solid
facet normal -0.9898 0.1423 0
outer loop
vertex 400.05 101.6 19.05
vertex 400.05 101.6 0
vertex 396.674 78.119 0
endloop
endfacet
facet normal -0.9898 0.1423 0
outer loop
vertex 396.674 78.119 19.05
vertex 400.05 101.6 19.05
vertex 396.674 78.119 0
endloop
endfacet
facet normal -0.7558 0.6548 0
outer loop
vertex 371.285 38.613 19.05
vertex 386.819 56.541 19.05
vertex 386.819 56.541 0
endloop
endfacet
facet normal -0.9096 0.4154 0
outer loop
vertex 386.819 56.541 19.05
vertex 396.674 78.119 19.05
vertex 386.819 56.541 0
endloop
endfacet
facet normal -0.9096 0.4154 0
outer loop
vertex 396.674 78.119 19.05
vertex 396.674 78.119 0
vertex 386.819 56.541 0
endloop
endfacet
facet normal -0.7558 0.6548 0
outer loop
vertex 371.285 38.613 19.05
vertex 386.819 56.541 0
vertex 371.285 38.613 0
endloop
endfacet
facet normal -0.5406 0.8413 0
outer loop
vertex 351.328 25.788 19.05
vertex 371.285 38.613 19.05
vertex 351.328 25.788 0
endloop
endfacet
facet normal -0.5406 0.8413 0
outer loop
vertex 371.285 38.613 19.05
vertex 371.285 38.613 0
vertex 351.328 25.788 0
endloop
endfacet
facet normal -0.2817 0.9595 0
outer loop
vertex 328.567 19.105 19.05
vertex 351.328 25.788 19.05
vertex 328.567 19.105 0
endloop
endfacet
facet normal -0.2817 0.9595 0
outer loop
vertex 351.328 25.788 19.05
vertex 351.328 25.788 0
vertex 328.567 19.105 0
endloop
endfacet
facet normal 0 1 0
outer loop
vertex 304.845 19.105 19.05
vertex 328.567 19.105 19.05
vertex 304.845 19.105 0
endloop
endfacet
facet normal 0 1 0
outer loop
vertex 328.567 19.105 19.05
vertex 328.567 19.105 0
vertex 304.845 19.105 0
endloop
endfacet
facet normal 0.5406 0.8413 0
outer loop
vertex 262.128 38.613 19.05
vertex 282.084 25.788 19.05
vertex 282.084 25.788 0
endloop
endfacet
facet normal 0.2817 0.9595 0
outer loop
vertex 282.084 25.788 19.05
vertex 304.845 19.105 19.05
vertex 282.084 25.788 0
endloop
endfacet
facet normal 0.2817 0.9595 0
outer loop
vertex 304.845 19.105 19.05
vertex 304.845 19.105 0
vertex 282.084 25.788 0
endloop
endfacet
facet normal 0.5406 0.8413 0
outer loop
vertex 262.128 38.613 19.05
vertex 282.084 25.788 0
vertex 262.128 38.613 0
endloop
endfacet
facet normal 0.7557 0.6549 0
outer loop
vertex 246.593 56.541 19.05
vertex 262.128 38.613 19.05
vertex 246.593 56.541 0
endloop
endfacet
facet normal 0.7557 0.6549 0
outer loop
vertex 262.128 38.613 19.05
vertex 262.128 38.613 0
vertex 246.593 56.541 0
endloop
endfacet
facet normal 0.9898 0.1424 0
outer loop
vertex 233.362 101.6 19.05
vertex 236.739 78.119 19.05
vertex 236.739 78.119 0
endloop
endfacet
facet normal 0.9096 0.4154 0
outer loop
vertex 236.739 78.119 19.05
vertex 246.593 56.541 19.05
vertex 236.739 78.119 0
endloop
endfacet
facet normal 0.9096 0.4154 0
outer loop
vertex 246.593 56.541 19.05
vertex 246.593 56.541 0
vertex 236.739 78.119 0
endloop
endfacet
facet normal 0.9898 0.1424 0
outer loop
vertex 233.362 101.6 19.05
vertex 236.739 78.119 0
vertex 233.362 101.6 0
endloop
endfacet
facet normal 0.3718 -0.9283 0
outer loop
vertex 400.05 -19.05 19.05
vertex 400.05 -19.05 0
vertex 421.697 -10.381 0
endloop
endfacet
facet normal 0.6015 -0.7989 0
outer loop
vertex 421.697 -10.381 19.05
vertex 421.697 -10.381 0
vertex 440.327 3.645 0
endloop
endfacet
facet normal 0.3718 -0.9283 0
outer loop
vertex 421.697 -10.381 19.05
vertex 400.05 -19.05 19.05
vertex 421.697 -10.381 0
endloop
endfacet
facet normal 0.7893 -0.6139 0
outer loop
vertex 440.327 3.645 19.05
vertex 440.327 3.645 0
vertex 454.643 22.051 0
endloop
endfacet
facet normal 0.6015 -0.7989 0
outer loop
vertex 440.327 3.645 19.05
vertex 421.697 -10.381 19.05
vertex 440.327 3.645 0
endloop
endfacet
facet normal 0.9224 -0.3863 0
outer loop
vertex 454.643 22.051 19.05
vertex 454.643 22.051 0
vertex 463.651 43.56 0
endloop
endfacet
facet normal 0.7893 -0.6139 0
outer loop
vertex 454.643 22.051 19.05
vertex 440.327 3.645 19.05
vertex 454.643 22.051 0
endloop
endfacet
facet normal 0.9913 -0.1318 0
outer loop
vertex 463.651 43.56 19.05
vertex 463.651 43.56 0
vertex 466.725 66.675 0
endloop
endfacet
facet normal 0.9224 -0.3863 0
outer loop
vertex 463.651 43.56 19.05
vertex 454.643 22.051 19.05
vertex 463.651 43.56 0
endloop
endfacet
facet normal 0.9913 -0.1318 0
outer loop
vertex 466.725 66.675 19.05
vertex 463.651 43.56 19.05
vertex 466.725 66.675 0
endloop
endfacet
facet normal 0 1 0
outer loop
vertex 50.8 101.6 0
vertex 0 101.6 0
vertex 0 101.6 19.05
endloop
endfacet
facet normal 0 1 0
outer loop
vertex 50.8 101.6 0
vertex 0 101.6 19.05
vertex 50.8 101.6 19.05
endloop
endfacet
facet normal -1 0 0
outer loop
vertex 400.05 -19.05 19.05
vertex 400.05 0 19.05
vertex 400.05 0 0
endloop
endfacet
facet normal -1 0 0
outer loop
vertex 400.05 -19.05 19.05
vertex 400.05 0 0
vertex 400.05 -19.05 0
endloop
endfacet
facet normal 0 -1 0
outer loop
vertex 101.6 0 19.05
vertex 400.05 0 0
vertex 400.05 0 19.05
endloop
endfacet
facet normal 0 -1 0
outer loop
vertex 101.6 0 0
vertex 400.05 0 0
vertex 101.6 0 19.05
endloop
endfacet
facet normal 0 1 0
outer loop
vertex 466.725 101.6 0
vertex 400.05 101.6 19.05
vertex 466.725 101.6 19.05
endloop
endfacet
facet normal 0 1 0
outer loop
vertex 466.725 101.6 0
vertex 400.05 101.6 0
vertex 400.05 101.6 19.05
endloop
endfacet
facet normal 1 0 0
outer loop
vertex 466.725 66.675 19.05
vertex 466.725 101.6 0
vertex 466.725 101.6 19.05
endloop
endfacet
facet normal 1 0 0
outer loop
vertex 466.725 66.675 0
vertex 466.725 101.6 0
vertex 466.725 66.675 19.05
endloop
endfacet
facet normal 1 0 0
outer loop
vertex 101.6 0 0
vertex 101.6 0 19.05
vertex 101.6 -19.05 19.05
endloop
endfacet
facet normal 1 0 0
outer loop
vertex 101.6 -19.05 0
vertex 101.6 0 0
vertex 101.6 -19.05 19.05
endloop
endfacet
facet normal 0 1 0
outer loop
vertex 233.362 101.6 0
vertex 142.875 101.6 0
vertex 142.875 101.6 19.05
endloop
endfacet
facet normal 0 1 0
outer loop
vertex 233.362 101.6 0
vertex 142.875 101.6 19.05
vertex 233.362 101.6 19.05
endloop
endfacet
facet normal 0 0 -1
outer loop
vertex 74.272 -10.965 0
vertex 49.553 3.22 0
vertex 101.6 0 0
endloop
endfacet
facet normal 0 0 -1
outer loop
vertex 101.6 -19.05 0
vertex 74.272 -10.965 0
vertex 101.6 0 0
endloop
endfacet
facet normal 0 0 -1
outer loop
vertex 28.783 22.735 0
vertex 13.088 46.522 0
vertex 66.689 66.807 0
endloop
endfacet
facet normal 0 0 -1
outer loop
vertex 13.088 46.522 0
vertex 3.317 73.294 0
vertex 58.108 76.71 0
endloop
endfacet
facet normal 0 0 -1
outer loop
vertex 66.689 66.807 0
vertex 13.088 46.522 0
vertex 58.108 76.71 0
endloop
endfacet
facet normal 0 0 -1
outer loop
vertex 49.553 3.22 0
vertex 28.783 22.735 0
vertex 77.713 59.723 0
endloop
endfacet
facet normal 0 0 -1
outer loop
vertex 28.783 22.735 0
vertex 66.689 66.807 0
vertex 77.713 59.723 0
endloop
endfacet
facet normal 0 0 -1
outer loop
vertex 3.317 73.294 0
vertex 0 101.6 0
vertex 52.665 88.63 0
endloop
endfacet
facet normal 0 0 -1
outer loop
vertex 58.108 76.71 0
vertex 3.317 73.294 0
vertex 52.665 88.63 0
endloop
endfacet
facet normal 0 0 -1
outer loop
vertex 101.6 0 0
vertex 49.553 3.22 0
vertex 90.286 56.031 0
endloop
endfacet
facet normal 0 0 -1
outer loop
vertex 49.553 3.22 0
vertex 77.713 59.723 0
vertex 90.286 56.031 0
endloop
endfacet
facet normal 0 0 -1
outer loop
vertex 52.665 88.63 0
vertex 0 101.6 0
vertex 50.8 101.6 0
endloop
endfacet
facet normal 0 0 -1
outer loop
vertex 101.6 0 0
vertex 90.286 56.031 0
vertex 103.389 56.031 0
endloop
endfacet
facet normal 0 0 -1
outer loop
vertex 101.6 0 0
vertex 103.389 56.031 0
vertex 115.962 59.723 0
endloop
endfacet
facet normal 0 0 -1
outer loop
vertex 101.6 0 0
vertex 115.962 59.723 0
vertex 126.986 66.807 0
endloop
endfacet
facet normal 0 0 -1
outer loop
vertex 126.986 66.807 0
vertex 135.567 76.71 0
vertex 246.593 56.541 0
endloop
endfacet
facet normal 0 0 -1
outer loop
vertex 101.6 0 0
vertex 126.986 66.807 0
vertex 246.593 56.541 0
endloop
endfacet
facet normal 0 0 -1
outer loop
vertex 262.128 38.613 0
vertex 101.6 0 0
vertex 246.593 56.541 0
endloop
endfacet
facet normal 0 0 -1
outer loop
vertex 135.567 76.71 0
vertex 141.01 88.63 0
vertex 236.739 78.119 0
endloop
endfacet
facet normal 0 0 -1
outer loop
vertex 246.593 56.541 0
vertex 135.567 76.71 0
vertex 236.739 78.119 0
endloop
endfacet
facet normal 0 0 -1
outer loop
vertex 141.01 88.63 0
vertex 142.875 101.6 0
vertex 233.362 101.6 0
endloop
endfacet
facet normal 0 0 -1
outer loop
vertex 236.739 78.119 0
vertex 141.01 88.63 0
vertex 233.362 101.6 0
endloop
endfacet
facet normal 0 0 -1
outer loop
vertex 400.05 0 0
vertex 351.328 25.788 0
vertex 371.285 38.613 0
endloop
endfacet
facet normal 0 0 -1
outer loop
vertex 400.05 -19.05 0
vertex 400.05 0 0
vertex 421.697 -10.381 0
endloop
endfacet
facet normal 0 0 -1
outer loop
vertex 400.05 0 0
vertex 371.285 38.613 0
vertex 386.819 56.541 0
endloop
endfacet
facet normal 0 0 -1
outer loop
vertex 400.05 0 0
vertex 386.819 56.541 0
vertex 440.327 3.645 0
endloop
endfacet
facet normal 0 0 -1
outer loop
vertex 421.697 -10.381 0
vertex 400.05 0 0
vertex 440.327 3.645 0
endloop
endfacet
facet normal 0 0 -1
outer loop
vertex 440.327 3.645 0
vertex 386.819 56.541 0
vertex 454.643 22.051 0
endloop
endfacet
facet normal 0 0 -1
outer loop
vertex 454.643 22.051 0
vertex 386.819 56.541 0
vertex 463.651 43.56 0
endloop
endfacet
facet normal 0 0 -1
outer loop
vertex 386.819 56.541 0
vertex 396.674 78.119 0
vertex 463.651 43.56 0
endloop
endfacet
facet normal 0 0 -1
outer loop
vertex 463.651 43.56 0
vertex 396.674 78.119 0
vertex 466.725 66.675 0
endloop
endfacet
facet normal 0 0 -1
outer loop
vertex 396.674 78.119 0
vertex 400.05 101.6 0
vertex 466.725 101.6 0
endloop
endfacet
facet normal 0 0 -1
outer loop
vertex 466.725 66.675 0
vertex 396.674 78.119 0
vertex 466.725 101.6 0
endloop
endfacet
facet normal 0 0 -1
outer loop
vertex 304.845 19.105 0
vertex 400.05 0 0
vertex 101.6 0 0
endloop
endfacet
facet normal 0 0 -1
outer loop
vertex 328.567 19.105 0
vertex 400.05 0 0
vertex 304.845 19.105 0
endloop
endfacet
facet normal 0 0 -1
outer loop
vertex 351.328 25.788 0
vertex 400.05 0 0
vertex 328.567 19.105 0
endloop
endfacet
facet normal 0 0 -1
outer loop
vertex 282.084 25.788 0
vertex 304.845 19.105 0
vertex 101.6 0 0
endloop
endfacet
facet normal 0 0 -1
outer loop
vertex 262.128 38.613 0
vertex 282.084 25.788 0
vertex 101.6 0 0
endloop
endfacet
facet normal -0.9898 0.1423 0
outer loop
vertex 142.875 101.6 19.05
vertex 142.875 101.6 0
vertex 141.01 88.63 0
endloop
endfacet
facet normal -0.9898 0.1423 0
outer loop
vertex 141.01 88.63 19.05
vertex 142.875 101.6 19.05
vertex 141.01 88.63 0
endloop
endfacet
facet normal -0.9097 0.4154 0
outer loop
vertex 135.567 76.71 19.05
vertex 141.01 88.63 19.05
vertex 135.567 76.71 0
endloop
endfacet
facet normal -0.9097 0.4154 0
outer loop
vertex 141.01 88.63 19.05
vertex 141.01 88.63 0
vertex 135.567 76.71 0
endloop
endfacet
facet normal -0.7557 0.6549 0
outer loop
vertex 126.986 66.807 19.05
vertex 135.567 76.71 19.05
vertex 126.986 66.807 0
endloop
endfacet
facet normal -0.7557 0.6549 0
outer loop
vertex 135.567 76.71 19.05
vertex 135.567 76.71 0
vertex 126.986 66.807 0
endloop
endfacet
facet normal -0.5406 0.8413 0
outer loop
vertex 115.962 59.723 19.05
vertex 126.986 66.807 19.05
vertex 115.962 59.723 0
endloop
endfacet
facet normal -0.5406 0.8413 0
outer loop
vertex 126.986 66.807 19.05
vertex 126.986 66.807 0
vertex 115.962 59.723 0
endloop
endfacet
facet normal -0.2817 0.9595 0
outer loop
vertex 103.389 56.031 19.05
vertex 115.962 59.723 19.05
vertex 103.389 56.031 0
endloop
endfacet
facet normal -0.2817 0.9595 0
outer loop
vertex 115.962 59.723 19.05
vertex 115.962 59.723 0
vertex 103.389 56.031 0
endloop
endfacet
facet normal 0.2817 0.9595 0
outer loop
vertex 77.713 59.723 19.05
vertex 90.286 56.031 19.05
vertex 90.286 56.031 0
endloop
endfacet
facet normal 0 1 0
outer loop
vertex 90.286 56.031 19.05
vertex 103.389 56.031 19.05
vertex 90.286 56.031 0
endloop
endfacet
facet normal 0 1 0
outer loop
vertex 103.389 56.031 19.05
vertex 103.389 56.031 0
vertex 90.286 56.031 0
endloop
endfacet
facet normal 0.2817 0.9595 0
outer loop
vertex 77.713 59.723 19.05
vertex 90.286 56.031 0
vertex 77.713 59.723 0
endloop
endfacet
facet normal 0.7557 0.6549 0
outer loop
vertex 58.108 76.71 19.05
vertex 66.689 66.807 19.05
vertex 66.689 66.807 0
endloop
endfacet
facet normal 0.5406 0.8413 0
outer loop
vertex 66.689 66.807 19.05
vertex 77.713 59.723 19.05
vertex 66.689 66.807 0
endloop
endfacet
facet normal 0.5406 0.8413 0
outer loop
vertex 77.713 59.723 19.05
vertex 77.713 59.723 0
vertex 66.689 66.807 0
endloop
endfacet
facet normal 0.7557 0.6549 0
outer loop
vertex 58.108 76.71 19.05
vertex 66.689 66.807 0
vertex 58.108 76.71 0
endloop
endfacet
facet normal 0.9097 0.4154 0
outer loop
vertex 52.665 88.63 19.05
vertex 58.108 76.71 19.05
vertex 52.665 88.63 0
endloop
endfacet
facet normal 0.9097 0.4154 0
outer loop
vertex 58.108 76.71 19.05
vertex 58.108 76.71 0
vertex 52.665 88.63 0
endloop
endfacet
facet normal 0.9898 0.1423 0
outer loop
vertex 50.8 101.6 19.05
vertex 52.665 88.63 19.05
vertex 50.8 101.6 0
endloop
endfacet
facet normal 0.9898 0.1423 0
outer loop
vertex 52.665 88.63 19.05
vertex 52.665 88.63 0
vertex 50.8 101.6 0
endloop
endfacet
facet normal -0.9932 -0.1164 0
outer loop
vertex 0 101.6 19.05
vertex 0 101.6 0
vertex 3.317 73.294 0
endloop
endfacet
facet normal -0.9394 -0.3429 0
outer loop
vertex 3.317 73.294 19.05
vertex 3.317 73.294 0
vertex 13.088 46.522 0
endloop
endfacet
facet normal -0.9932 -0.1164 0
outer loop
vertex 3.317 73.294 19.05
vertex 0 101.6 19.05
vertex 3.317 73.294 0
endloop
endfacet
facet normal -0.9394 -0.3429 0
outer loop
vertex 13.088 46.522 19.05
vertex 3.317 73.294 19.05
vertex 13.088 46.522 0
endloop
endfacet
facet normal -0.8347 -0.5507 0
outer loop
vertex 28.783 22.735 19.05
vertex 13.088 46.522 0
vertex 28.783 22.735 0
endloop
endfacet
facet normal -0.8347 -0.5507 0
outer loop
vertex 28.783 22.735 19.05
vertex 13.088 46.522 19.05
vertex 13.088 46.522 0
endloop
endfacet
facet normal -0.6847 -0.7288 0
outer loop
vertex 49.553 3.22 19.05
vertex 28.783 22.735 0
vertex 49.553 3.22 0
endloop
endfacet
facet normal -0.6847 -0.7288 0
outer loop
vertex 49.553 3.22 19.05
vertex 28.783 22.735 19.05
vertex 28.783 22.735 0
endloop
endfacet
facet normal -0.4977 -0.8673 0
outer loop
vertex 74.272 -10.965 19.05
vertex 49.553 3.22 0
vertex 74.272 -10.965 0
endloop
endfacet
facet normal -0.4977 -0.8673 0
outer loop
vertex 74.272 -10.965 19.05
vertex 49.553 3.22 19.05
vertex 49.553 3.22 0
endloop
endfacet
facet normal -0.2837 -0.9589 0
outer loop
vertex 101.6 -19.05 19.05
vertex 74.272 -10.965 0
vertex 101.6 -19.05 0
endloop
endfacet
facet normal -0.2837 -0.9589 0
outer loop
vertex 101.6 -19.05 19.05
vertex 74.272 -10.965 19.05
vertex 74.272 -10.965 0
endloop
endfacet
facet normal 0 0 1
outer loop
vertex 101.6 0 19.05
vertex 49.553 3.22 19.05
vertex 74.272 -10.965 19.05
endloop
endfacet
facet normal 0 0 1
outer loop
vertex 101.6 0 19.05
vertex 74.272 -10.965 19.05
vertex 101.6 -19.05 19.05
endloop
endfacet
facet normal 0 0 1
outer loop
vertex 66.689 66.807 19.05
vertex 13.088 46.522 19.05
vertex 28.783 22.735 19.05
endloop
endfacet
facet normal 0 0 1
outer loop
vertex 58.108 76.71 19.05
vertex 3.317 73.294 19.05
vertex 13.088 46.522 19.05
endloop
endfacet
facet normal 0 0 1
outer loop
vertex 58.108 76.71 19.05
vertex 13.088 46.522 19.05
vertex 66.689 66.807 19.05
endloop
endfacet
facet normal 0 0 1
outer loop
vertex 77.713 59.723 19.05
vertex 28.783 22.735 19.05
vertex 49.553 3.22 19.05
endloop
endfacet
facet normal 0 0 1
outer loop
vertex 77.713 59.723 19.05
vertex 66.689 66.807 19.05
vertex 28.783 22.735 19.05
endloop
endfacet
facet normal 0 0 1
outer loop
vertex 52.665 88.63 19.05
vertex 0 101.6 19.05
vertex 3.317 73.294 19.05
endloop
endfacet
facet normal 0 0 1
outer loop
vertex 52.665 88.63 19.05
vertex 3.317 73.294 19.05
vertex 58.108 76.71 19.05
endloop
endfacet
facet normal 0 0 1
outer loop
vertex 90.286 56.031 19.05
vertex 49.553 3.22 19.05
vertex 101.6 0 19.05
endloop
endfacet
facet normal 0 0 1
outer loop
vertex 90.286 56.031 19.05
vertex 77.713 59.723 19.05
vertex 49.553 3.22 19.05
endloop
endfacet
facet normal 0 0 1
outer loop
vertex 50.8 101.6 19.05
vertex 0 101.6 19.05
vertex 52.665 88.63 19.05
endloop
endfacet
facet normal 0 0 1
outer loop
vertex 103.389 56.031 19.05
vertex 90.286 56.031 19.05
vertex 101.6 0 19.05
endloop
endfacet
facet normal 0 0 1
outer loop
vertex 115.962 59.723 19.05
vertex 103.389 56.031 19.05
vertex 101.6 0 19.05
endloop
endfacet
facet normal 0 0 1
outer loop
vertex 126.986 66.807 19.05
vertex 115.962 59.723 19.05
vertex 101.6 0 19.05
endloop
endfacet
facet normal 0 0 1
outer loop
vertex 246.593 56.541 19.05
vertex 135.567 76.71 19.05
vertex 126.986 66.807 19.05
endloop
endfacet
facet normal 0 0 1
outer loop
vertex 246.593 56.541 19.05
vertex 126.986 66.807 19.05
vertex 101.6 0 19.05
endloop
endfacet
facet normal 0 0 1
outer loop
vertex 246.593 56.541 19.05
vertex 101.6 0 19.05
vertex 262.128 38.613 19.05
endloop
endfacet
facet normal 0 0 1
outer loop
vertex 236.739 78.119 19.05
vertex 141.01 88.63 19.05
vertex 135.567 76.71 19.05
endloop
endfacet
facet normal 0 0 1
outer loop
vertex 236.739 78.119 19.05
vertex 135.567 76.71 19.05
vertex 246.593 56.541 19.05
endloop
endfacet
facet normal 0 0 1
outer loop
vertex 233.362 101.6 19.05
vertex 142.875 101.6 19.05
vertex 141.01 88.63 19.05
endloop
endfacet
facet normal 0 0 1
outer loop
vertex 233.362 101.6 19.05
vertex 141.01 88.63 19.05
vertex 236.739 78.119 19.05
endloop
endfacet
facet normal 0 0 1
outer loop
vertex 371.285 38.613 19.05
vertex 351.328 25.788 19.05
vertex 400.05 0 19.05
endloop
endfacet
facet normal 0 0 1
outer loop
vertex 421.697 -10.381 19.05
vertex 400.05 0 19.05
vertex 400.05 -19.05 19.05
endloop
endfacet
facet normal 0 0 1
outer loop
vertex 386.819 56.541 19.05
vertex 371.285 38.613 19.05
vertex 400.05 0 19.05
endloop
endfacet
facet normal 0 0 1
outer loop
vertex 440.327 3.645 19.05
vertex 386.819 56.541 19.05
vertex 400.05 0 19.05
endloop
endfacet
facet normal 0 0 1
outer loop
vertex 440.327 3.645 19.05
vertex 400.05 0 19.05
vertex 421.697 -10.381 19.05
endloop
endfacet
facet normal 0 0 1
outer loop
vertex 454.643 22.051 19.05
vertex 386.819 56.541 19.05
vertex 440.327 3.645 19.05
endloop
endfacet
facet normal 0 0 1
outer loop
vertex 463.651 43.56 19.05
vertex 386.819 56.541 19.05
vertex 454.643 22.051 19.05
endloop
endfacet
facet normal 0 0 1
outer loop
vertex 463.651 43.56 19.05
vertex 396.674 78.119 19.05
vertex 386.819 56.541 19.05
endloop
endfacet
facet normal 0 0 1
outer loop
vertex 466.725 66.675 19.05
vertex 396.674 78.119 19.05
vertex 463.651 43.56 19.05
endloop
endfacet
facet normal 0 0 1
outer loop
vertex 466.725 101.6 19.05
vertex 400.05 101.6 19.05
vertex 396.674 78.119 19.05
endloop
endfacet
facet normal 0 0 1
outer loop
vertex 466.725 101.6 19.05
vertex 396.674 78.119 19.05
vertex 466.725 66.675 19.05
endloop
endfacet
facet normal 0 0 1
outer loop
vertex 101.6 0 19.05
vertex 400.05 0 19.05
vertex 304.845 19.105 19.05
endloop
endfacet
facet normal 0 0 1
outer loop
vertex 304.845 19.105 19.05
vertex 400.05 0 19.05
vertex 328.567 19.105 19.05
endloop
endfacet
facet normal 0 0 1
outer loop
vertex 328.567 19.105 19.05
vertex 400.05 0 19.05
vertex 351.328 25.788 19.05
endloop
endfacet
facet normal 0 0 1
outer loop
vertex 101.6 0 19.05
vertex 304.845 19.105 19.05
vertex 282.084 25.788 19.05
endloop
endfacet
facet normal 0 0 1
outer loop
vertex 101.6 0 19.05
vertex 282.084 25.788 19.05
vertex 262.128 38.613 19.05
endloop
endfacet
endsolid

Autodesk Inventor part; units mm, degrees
ref_plane "YZ Plane" through (0, 0, 0) normal (1, 0, 0) x (0, 1, 0)
ref_plane "XZ Plane" through (0, 0, 0) normal (0, 1, 0) x (-1, 0, 0)
ref_plane "XY Plane" through (0, 0, 0) normal (0, 0, 1) x (1, 0, 0)
sketch "Sketch1" plane through (0, 0, 0) normal (0, 0, 1) x (1, 0, 0)
  line L0 (0, 101.6) -> (50.8, 101.6)
  line L1 (466.725, 101.6) -> (466.725, 66.675)
  line L2 (466.725, 0) -> (400.05, 0) construction
  line L3 (0, 0) -> (0, 101.6) construction
  arc A0 (50.8, 101.6) -> (142.875, 101.6) centre (96.8375, 101.6) ccw
  arc A1 (233.3625, 101.6) -> (400.05, 101.6) centre (316.7062, 101.6) ccw
  line L4 (50.8, 101.6) -> (142.875, 101.6) construction
  line L5 (142.875, 101.6) -> (233.3625, 101.6)
  line L6 (233.3625, 101.6) -> (400.05, 101.6) construction
  line L7 (400.05, 101.6) -> (466.725, 101.6)
  arc A2 (0, 101.6) -> (101.6, 0) centre (101.6, 101.6) ccw
  arc A3 (400.05, 0) -> (466.725, 66.675) centre (400.05, 66.675) ccw
  line L8 (400.05, 0) -> (101.6, 0)
  line L9 (466.725, 66.675) -> (466.725, 0) construction
  line L10 (101.6, 0) -> (0, 0) construction
  dimension "d0" = 466.725
  dimension "d1" = 101.6
  dimension "d2" = 50.8
  dimension "d3" = 90.4875
  dimension "d4" = 66.675
  dimension "d5" = 92.075
  dimension "d6" = 166.6875
extrude "Extrusion1" add sketch "Sketch1" along normal blind 19.05
sketch "Sketch2" plane through (0, 0, 19.05) normal (0, 0, 1) x (1, 0, 0)
  line L0 (101.6, 0) -> (101.6, -19.05) projected
  arc A0 (0, 101.6) -> (101.6, 0) centre (101.6, 101.6) ccw projected
  line L1 (400.05, 0) -> (400.05, -19.05) projected
  arc A1 (400.05, 0) -> (466.725, 66.675) centre (400.05, 66.675) ccw projected
  arc A2 (400.05, -19.05) -> (466.725, 66.675) centre (378.2786, 66.675) ccw
  line L2 (466.725, 66.675) -> (466.725, 101.6) projected
  arc A3 (0, 101.6) -> (101.6, -19.05) centre (122.4359, 101.6) ccw
  line L3 (0, 101.6) -> (0, 165.1)
  point P0 (0, 0)
extrude "Extrusion2" add sketch "Sketch2" against normal up to surface (19.05 mm away)
properties part number "cannon support front"
